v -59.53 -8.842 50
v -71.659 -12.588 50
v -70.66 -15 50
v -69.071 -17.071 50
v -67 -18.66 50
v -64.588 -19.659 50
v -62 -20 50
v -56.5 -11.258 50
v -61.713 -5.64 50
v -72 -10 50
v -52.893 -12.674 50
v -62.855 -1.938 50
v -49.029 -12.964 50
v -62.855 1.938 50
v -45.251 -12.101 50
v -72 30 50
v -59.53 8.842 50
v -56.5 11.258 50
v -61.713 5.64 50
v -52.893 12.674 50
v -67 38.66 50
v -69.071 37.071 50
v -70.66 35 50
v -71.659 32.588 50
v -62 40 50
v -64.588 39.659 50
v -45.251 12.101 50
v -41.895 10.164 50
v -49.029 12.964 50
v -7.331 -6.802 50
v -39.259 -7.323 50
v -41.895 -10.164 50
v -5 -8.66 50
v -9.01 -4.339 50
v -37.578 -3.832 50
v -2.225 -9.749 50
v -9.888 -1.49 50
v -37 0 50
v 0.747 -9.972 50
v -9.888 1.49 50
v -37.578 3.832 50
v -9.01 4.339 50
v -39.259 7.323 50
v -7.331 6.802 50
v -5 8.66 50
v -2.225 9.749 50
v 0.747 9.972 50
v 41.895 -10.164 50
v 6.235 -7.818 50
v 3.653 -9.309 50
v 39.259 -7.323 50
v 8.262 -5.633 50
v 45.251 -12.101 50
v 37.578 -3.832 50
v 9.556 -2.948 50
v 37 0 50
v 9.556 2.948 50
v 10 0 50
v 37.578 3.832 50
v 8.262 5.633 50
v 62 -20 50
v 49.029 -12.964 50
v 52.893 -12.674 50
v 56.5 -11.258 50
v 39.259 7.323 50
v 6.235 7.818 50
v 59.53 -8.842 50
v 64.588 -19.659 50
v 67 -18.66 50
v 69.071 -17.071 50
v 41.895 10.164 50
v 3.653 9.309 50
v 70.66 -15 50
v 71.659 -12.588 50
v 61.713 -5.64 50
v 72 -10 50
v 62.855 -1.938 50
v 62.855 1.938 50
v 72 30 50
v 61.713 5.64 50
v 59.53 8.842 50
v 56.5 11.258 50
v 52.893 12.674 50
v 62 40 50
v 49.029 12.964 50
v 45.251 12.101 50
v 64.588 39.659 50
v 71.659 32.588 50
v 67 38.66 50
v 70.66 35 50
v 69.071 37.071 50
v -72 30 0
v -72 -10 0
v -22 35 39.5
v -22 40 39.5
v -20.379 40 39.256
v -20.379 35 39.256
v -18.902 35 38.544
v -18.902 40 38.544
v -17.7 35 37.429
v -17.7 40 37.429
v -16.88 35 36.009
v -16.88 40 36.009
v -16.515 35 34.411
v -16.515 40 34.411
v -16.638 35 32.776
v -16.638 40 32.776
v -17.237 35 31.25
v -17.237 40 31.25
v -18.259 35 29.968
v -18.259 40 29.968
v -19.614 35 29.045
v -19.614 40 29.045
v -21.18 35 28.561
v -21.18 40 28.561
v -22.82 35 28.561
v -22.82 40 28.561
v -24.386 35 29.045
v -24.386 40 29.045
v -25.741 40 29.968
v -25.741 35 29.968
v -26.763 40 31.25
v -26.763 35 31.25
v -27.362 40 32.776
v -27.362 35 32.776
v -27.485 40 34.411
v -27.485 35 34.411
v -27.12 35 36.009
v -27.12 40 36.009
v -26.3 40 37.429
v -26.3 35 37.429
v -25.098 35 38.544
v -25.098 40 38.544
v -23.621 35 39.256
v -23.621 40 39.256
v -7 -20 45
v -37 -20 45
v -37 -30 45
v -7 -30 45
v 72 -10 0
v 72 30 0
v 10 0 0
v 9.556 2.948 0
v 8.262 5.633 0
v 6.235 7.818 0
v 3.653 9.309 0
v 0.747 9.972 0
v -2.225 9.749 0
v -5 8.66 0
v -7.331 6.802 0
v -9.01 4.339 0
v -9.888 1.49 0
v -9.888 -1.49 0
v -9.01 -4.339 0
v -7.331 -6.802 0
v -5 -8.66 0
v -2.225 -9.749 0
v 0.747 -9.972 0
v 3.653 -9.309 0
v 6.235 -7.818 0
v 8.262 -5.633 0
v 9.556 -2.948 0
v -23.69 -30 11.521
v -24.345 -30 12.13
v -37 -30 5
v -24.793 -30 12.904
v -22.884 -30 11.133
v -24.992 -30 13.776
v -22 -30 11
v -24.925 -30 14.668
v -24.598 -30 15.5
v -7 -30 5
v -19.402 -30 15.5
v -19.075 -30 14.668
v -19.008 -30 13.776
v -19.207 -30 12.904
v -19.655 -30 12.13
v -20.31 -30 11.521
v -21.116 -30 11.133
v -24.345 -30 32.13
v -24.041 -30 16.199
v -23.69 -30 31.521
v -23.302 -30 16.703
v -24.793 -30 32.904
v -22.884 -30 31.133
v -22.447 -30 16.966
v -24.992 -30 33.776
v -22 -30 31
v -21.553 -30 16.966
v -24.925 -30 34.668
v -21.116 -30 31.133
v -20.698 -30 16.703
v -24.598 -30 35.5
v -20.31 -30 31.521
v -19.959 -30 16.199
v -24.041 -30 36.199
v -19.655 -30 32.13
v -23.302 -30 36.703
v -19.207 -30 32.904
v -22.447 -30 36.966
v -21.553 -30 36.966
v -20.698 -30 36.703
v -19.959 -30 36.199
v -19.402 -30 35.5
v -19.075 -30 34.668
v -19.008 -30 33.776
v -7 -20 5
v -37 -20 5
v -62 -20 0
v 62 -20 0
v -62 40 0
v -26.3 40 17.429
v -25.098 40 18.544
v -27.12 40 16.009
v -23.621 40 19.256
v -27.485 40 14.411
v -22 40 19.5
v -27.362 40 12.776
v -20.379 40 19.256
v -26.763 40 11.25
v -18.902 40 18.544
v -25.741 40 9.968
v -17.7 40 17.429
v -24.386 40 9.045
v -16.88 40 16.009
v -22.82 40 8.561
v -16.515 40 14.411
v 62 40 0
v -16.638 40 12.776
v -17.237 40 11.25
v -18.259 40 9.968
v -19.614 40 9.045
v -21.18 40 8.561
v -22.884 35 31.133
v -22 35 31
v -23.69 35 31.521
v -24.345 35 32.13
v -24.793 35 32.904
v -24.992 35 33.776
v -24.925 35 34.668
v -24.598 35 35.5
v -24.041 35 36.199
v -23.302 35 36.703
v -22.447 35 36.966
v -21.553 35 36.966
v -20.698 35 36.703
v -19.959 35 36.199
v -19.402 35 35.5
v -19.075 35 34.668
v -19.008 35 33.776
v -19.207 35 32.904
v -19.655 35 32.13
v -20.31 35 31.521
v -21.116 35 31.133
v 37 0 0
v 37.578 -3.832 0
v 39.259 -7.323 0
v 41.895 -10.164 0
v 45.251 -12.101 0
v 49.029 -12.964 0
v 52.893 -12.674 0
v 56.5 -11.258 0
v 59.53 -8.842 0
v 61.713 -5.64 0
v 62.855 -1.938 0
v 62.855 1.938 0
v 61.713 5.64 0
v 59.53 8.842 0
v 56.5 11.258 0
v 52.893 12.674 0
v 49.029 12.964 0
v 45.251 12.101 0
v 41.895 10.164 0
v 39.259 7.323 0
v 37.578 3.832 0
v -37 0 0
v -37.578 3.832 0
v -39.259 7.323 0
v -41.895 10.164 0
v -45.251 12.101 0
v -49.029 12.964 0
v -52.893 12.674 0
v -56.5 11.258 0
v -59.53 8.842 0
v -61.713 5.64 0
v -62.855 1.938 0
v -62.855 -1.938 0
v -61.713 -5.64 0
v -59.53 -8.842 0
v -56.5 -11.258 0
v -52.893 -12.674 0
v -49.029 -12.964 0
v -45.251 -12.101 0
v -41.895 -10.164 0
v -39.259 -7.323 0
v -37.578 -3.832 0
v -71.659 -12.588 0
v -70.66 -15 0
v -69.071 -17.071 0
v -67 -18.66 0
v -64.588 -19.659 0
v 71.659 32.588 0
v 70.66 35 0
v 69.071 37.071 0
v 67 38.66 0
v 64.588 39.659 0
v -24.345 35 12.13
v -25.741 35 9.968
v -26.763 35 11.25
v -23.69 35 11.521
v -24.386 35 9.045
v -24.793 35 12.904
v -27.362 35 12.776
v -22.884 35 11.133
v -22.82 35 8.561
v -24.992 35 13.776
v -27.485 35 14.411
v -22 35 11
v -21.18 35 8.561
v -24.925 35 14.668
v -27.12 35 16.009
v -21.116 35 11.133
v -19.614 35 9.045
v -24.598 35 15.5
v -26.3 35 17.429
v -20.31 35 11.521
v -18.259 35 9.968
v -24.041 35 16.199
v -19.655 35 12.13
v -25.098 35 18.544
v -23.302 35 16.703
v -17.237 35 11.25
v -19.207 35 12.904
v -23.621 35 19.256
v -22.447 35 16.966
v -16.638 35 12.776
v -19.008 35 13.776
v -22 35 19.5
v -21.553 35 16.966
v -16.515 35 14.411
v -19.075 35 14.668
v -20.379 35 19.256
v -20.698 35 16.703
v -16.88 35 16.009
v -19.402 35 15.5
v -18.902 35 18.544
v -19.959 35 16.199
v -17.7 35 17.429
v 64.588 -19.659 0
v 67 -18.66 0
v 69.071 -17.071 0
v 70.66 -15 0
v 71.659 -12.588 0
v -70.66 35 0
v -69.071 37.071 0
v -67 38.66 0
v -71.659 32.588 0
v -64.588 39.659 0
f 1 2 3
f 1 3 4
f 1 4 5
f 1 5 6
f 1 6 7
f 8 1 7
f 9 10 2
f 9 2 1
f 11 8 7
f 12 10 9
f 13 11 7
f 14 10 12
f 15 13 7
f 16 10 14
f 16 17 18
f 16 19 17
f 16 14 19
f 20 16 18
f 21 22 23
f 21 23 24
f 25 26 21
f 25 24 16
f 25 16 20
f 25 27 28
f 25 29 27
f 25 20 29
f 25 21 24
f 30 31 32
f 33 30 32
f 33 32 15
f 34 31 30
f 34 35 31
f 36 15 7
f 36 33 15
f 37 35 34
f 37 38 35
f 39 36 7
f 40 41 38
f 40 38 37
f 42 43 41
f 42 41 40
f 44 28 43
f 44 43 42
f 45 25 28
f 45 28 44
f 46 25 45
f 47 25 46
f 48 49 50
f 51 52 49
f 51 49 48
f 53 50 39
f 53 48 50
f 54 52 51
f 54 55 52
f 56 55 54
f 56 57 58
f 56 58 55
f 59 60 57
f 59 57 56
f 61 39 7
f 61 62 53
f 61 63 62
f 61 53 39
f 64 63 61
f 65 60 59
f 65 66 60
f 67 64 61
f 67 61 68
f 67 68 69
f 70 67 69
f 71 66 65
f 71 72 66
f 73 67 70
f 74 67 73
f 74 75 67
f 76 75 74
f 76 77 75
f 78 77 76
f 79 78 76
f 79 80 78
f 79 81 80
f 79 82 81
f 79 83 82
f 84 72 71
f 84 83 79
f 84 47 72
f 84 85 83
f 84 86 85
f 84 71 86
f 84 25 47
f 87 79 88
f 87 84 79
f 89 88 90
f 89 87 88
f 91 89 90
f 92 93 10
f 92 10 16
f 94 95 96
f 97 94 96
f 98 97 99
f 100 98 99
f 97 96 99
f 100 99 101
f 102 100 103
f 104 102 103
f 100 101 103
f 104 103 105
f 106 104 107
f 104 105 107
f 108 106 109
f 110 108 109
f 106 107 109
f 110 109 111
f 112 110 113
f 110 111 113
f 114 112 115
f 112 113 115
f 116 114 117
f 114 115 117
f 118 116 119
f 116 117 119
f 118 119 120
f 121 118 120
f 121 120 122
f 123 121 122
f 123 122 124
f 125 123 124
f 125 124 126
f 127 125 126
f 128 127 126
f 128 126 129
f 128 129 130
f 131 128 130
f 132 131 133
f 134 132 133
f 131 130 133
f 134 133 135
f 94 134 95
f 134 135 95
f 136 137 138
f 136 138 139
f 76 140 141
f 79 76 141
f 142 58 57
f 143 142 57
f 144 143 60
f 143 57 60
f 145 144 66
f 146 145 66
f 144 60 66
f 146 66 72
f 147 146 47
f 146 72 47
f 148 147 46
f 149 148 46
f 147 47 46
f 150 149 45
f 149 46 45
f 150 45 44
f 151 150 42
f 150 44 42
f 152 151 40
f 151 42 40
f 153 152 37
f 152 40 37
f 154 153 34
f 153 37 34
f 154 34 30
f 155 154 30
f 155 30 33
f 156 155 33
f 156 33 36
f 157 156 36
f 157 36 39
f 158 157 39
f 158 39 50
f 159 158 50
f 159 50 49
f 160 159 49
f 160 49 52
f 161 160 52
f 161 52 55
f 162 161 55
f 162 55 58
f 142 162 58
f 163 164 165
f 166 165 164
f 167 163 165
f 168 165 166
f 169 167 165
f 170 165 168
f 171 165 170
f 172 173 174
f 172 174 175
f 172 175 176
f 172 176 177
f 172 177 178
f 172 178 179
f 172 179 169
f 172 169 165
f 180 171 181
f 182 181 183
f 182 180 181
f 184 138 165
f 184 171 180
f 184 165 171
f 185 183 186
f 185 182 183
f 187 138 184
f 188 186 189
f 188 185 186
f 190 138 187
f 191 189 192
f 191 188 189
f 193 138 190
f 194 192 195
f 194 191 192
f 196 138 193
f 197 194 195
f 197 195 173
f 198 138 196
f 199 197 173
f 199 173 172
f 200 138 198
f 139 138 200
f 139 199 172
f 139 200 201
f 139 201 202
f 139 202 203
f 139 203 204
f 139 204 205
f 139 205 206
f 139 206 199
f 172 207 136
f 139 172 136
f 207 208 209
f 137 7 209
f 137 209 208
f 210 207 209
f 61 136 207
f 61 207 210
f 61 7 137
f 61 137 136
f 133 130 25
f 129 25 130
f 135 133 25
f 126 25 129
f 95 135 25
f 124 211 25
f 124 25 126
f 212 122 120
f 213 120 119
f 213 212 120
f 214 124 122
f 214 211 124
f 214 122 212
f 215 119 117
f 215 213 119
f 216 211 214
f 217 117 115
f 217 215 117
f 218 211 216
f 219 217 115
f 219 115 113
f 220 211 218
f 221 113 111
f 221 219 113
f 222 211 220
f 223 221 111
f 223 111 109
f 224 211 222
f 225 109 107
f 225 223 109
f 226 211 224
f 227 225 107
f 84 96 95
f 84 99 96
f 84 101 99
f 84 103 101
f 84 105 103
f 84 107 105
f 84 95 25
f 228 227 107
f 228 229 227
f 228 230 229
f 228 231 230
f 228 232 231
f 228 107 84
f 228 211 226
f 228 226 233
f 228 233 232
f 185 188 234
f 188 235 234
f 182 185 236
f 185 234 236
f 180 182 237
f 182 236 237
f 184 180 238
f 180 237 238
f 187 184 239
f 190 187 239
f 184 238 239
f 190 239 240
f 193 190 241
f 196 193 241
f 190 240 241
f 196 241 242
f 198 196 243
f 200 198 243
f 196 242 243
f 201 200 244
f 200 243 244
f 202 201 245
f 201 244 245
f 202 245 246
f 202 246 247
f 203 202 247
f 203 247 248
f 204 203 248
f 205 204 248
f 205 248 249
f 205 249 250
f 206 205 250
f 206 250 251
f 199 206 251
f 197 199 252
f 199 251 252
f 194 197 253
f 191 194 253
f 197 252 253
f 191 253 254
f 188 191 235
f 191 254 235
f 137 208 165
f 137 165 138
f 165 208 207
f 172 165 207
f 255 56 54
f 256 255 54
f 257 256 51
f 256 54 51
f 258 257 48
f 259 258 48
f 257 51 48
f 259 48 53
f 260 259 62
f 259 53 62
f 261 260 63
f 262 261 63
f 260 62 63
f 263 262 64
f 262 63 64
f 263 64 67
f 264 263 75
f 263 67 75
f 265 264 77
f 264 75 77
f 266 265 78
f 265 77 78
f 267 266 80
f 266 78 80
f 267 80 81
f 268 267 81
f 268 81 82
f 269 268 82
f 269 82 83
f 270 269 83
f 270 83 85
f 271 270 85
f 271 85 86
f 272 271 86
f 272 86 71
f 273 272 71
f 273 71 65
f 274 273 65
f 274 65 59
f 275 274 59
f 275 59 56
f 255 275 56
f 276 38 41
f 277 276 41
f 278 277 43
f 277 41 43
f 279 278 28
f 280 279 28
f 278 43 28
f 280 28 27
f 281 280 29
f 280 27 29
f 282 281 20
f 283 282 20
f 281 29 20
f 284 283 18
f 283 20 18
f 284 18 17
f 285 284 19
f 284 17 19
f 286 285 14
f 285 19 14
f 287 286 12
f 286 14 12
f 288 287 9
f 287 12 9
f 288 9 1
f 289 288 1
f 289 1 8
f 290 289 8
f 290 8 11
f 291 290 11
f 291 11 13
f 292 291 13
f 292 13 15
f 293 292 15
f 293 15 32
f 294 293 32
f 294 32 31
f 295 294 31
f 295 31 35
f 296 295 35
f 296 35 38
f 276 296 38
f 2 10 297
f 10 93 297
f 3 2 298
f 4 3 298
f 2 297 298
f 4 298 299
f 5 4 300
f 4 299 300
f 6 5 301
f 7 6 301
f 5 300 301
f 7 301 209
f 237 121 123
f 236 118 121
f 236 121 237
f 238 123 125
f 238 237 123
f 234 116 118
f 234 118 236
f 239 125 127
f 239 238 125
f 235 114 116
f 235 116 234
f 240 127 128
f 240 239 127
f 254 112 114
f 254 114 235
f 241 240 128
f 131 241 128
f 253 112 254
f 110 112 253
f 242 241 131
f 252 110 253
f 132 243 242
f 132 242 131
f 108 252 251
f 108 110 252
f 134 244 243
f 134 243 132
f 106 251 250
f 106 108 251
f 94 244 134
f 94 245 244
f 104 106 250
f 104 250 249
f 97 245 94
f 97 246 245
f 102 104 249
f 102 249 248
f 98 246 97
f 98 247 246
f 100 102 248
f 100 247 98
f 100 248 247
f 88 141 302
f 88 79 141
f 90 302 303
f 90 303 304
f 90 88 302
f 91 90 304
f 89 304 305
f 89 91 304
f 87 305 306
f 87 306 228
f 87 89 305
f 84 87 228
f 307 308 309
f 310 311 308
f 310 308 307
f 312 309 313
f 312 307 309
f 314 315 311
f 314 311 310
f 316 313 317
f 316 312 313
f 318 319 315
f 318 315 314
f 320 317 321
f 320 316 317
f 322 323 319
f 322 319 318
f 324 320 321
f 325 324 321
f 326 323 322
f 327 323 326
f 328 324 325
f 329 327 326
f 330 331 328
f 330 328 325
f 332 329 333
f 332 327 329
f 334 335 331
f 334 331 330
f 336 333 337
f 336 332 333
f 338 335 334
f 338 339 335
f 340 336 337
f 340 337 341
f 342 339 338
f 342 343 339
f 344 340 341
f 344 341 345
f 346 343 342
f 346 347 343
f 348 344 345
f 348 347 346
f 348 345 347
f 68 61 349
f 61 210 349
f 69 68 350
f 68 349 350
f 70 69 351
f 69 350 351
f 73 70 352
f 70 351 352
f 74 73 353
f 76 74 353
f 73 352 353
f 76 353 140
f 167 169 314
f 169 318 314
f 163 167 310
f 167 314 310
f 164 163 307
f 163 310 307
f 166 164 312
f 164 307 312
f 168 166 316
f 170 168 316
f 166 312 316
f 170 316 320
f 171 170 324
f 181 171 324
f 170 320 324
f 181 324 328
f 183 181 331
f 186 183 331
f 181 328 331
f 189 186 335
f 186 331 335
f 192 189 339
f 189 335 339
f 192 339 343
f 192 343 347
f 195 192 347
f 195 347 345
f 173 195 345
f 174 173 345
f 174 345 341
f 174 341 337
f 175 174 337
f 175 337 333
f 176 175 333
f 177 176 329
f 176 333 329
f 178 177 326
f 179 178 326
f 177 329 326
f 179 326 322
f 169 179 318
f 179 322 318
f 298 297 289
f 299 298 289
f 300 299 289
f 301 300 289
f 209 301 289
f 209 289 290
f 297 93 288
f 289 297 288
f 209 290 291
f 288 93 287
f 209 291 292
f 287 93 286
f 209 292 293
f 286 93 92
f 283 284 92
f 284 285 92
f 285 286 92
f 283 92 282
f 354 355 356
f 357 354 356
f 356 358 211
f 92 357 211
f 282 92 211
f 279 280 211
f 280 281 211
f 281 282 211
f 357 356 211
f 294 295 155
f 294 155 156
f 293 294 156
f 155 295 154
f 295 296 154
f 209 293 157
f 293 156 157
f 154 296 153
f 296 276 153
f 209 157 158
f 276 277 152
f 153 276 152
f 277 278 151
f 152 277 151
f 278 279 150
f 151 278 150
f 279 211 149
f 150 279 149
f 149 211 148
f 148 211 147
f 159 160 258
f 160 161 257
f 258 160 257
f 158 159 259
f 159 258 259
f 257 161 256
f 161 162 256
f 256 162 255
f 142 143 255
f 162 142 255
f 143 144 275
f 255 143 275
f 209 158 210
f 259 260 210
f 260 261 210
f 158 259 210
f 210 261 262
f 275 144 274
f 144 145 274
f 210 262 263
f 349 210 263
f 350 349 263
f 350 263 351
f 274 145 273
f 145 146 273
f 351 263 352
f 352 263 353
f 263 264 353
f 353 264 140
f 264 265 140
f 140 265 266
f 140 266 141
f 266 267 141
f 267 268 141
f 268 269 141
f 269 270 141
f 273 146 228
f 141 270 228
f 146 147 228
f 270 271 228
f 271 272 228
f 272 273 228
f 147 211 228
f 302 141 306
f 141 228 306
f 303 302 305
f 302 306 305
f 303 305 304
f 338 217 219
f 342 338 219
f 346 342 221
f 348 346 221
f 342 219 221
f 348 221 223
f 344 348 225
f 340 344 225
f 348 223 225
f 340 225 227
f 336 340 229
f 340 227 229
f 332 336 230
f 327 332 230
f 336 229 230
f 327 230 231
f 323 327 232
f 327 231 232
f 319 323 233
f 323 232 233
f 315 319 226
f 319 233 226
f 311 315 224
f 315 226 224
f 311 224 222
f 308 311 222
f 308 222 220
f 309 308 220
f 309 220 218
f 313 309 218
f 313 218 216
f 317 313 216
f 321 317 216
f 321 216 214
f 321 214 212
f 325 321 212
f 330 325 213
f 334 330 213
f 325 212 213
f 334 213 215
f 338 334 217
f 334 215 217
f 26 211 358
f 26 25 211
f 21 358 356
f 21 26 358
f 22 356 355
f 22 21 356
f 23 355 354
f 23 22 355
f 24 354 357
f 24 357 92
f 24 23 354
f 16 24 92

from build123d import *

# Parameters (mm, degrees)
SKETCH1_W           = 144
SKETCH1_H           = 80
BOSS_EXTRUDE1_DEPTH = 50
CUT_EXTRUDE1_REACH  = 98.354
SKETCH2_R           = 10
SKETCH2_R_2         = 13
CUT_EXTRUDE3_REACH  = 98.354
SKETCH3_W           = 144
SKETCH3_H           = 20
SKETCH5_R           = 3
CUT_EXTRUDE4_DEPTH  = 100
FILLET1_R           = 10
FILLET2_R           = 10
FILLET3_R           = 10
FILLET4_R           = 10
SKETCH6_R           = 5.5
CUT_EXTRUDE5_DEPTH  = 5
SKETCH7_W           = 30
SKETCH7_H           = 40
BOSS_EXTRUDE2_DEPTH = 10
CUT_EXTRUDE7_REACH  = 108.226
SKETCH8_R           = 3


with BuildPart() as part:
    # Sketch1 → Boss-Extrude1 (new body)
    with BuildSketch(Plane.XY):
        Rectangle(SKETCH1_W, SKETCH1_H)
    extrude(amount=BOSS_EXTRUDE1_DEPTH)

    # Sketch2 → Cut-Extrude1 (cut, up to next)
    with BuildSketch(Plane.XY.offset(50), mode=Mode.PRIVATE) as cut_extrude1_sk1:
        Circle(SKETCH2_R)
    cut_extrude1_tool1 = extrude(cut_extrude1_sk1.sketch, amount=-CUT_EXTRUDE1_REACH, mode=Mode.PRIVATE) & part.part
    # Sketch2 → Cut-Extrude1 (cut, up to next)
    with BuildSketch(Plane.XY.offset(50), mode=Mode.PRIVATE) as cut_extrude1_sk2:
        with Locations((-50, 0)):
            Circle(SKETCH2_R_2)
    cut_extrude1_tool2 = extrude(cut_extrude1_sk2.sketch, amount=-CUT_EXTRUDE1_REACH, mode=Mode.PRIVATE) & part.part
    # Sketch2 → Cut-Extrude1 (cut, up to next)
    with BuildSketch(Plane.XY.offset(50), mode=Mode.PRIVATE) as cut_extrude1_sk3:
        with Locations(Location((50, 0, 0), (0, 0, 180))):
            Circle(SKETCH2_R_2)
    cut_extrude1_tool3 = extrude(cut_extrude1_sk3.sketch, amount=-CUT_EXTRUDE1_REACH, mode=Mode.PRIVATE) & part.part
    add(cut_extrude1_tool1.solids().sort_by_distance((0, 0, 50))[0], mode=Mode.SUBTRACT)
    add(cut_extrude1_tool2.solids().sort_by_distance((-50, 0, 50))[0], mode=Mode.SUBTRACT)
    add(cut_extrude1_tool3.solids().sort_by_distance((50, 0, 50))[0], mode=Mode.SUBTRACT)

    # Sketch3 → Cut-Extrude3 (cut, up to next)
    with BuildSketch(Plane.XY.offset(50), mode=Mode.PRIVATE) as cut_extrude3_sk1:
        with Locations((0, -30)):
            Rectangle(SKETCH3_W, SKETCH3_H)
    cut_extrude3_tool1 = extrude(cut_extrude3_sk1.sketch, amount=-CUT_EXTRUDE3_REACH, mode=Mode.PRIVATE) & part.part
    add(cut_extrude3_tool1.solids().sort_by_distance((0, -30, 50))[0], mode=Mode.SUBTRACT)

    # Sketch5 → Cut-Extrude4 (cut)
    with BuildSketch(Plane.XZ.offset(20)):
        with Locations(Location((-22, 34, 0), (0, 0, 270))):
            Circle(SKETCH5_R)
        with Locations(Location((-22, 14, 0), (0, 0, 270))):
            Circle(SKETCH5_R)
    extrude(amount=-CUT_EXTRUDE4_DEPTH, mode=Mode.SUBTRACT)

    # Fillet1
    fillet1_edges = [part.edges().sort_by_distance(p)[0] for p in [
        (72, -20, 25),
    ]]
    fillet(fillet1_edges, radius=FILLET1_R)

    # Fillet2
    fillet2_edges = [part.edges().sort_by_distance(p)[0] for p in [
        (72, 40, 25),
    ]]
    fillet(fillet2_edges, radius=FILLET2_R)

    # Fillet3
    fillet3_edges = [part.edges().sort_by_distance(p)[0] for p in [
        (-72, 40, 25),
    ]]
    fillet(fillet3_edges, radius=FILLET3_R)

    # Fillet4
    fillet4_edges = [part.edges().sort_by_distance(p)[0] for p in [
        (-72, -20, 25),
    ]]
    fillet(fillet4_edges, radius=FILLET4_R)

    # Sketch6 → Cut-Extrude5 (cut)
    with BuildSketch(Plane(origin=(0, 40, 0), x_dir=(1, 0, 0), z_dir=(0, 1, 0))):
        with Locations(Location((-22, -14, 0), (0, 0, 270))):
            Circle(SKETCH6_R)
        with Locations(Location((-22, -34, 0), (0, 0, 270))):
            Circle(SKETCH6_R)
    extrude(amount=-CUT_EXTRUDE5_DEPTH, mode=Mode.SUBTRACT)

    # Sketch7 → Boss-Extrude2 (add)
    with BuildSketch(Plane.XZ.offset(20)):
        with Locations((-22, 25)):
            Rectangle(SKETCH7_W, SKETCH7_H)
    extrude(amount=BOSS_EXTRUDE2_DEPTH)

    # Sketch8 → Cut-Extrude7 (cut, up to next)
    with BuildSketch(Plane(origin=(0, -20, 0), x_dir=(1, 0, 0), z_dir=(0, 1, 0)), mode=Mode.PRIVATE) as cut_extrude7_sk1:
        with Locations(Location((-22, -34, 0), (0, 0, 90))):
            Circle(SKETCH8_R)
    cut_extrude7_tool1 = extrude(cut_extrude7_sk1.sketch, amount=-CUT_EXTRUDE7_REACH, mode=Mode.PRIVATE) & part.part
    # Sketch8 → Cut-Extrude7 (cut, up to next)
    with BuildSketch(Plane(origin=(0, -20, 0), x_dir=(1, 0, 0), z_dir=(0, 1, 0)), mode=Mode.PRIVATE) as cut_extrude7_sk2:
        with Locations(Location((-22, -14, 0), (0, 0, 90))):
            Circle(SKETCH8_R)
    cut_extrude7_tool2 = extrude(cut_extrude7_sk2.sketch, amount=-CUT_EXTRUDE7_REACH, mode=Mode.PRIVATE) & part.part
    add(cut_extrude7_tool1.solids().sort_by_distance((-22, -20, 34))[0], mode=Mode.SUBTRACT)
    add(cut_extrude7_tool2.solids().sort_by_distance((-22, -20, 14))[0], mode=Mode.SUBTRACT)


solid = part.part
